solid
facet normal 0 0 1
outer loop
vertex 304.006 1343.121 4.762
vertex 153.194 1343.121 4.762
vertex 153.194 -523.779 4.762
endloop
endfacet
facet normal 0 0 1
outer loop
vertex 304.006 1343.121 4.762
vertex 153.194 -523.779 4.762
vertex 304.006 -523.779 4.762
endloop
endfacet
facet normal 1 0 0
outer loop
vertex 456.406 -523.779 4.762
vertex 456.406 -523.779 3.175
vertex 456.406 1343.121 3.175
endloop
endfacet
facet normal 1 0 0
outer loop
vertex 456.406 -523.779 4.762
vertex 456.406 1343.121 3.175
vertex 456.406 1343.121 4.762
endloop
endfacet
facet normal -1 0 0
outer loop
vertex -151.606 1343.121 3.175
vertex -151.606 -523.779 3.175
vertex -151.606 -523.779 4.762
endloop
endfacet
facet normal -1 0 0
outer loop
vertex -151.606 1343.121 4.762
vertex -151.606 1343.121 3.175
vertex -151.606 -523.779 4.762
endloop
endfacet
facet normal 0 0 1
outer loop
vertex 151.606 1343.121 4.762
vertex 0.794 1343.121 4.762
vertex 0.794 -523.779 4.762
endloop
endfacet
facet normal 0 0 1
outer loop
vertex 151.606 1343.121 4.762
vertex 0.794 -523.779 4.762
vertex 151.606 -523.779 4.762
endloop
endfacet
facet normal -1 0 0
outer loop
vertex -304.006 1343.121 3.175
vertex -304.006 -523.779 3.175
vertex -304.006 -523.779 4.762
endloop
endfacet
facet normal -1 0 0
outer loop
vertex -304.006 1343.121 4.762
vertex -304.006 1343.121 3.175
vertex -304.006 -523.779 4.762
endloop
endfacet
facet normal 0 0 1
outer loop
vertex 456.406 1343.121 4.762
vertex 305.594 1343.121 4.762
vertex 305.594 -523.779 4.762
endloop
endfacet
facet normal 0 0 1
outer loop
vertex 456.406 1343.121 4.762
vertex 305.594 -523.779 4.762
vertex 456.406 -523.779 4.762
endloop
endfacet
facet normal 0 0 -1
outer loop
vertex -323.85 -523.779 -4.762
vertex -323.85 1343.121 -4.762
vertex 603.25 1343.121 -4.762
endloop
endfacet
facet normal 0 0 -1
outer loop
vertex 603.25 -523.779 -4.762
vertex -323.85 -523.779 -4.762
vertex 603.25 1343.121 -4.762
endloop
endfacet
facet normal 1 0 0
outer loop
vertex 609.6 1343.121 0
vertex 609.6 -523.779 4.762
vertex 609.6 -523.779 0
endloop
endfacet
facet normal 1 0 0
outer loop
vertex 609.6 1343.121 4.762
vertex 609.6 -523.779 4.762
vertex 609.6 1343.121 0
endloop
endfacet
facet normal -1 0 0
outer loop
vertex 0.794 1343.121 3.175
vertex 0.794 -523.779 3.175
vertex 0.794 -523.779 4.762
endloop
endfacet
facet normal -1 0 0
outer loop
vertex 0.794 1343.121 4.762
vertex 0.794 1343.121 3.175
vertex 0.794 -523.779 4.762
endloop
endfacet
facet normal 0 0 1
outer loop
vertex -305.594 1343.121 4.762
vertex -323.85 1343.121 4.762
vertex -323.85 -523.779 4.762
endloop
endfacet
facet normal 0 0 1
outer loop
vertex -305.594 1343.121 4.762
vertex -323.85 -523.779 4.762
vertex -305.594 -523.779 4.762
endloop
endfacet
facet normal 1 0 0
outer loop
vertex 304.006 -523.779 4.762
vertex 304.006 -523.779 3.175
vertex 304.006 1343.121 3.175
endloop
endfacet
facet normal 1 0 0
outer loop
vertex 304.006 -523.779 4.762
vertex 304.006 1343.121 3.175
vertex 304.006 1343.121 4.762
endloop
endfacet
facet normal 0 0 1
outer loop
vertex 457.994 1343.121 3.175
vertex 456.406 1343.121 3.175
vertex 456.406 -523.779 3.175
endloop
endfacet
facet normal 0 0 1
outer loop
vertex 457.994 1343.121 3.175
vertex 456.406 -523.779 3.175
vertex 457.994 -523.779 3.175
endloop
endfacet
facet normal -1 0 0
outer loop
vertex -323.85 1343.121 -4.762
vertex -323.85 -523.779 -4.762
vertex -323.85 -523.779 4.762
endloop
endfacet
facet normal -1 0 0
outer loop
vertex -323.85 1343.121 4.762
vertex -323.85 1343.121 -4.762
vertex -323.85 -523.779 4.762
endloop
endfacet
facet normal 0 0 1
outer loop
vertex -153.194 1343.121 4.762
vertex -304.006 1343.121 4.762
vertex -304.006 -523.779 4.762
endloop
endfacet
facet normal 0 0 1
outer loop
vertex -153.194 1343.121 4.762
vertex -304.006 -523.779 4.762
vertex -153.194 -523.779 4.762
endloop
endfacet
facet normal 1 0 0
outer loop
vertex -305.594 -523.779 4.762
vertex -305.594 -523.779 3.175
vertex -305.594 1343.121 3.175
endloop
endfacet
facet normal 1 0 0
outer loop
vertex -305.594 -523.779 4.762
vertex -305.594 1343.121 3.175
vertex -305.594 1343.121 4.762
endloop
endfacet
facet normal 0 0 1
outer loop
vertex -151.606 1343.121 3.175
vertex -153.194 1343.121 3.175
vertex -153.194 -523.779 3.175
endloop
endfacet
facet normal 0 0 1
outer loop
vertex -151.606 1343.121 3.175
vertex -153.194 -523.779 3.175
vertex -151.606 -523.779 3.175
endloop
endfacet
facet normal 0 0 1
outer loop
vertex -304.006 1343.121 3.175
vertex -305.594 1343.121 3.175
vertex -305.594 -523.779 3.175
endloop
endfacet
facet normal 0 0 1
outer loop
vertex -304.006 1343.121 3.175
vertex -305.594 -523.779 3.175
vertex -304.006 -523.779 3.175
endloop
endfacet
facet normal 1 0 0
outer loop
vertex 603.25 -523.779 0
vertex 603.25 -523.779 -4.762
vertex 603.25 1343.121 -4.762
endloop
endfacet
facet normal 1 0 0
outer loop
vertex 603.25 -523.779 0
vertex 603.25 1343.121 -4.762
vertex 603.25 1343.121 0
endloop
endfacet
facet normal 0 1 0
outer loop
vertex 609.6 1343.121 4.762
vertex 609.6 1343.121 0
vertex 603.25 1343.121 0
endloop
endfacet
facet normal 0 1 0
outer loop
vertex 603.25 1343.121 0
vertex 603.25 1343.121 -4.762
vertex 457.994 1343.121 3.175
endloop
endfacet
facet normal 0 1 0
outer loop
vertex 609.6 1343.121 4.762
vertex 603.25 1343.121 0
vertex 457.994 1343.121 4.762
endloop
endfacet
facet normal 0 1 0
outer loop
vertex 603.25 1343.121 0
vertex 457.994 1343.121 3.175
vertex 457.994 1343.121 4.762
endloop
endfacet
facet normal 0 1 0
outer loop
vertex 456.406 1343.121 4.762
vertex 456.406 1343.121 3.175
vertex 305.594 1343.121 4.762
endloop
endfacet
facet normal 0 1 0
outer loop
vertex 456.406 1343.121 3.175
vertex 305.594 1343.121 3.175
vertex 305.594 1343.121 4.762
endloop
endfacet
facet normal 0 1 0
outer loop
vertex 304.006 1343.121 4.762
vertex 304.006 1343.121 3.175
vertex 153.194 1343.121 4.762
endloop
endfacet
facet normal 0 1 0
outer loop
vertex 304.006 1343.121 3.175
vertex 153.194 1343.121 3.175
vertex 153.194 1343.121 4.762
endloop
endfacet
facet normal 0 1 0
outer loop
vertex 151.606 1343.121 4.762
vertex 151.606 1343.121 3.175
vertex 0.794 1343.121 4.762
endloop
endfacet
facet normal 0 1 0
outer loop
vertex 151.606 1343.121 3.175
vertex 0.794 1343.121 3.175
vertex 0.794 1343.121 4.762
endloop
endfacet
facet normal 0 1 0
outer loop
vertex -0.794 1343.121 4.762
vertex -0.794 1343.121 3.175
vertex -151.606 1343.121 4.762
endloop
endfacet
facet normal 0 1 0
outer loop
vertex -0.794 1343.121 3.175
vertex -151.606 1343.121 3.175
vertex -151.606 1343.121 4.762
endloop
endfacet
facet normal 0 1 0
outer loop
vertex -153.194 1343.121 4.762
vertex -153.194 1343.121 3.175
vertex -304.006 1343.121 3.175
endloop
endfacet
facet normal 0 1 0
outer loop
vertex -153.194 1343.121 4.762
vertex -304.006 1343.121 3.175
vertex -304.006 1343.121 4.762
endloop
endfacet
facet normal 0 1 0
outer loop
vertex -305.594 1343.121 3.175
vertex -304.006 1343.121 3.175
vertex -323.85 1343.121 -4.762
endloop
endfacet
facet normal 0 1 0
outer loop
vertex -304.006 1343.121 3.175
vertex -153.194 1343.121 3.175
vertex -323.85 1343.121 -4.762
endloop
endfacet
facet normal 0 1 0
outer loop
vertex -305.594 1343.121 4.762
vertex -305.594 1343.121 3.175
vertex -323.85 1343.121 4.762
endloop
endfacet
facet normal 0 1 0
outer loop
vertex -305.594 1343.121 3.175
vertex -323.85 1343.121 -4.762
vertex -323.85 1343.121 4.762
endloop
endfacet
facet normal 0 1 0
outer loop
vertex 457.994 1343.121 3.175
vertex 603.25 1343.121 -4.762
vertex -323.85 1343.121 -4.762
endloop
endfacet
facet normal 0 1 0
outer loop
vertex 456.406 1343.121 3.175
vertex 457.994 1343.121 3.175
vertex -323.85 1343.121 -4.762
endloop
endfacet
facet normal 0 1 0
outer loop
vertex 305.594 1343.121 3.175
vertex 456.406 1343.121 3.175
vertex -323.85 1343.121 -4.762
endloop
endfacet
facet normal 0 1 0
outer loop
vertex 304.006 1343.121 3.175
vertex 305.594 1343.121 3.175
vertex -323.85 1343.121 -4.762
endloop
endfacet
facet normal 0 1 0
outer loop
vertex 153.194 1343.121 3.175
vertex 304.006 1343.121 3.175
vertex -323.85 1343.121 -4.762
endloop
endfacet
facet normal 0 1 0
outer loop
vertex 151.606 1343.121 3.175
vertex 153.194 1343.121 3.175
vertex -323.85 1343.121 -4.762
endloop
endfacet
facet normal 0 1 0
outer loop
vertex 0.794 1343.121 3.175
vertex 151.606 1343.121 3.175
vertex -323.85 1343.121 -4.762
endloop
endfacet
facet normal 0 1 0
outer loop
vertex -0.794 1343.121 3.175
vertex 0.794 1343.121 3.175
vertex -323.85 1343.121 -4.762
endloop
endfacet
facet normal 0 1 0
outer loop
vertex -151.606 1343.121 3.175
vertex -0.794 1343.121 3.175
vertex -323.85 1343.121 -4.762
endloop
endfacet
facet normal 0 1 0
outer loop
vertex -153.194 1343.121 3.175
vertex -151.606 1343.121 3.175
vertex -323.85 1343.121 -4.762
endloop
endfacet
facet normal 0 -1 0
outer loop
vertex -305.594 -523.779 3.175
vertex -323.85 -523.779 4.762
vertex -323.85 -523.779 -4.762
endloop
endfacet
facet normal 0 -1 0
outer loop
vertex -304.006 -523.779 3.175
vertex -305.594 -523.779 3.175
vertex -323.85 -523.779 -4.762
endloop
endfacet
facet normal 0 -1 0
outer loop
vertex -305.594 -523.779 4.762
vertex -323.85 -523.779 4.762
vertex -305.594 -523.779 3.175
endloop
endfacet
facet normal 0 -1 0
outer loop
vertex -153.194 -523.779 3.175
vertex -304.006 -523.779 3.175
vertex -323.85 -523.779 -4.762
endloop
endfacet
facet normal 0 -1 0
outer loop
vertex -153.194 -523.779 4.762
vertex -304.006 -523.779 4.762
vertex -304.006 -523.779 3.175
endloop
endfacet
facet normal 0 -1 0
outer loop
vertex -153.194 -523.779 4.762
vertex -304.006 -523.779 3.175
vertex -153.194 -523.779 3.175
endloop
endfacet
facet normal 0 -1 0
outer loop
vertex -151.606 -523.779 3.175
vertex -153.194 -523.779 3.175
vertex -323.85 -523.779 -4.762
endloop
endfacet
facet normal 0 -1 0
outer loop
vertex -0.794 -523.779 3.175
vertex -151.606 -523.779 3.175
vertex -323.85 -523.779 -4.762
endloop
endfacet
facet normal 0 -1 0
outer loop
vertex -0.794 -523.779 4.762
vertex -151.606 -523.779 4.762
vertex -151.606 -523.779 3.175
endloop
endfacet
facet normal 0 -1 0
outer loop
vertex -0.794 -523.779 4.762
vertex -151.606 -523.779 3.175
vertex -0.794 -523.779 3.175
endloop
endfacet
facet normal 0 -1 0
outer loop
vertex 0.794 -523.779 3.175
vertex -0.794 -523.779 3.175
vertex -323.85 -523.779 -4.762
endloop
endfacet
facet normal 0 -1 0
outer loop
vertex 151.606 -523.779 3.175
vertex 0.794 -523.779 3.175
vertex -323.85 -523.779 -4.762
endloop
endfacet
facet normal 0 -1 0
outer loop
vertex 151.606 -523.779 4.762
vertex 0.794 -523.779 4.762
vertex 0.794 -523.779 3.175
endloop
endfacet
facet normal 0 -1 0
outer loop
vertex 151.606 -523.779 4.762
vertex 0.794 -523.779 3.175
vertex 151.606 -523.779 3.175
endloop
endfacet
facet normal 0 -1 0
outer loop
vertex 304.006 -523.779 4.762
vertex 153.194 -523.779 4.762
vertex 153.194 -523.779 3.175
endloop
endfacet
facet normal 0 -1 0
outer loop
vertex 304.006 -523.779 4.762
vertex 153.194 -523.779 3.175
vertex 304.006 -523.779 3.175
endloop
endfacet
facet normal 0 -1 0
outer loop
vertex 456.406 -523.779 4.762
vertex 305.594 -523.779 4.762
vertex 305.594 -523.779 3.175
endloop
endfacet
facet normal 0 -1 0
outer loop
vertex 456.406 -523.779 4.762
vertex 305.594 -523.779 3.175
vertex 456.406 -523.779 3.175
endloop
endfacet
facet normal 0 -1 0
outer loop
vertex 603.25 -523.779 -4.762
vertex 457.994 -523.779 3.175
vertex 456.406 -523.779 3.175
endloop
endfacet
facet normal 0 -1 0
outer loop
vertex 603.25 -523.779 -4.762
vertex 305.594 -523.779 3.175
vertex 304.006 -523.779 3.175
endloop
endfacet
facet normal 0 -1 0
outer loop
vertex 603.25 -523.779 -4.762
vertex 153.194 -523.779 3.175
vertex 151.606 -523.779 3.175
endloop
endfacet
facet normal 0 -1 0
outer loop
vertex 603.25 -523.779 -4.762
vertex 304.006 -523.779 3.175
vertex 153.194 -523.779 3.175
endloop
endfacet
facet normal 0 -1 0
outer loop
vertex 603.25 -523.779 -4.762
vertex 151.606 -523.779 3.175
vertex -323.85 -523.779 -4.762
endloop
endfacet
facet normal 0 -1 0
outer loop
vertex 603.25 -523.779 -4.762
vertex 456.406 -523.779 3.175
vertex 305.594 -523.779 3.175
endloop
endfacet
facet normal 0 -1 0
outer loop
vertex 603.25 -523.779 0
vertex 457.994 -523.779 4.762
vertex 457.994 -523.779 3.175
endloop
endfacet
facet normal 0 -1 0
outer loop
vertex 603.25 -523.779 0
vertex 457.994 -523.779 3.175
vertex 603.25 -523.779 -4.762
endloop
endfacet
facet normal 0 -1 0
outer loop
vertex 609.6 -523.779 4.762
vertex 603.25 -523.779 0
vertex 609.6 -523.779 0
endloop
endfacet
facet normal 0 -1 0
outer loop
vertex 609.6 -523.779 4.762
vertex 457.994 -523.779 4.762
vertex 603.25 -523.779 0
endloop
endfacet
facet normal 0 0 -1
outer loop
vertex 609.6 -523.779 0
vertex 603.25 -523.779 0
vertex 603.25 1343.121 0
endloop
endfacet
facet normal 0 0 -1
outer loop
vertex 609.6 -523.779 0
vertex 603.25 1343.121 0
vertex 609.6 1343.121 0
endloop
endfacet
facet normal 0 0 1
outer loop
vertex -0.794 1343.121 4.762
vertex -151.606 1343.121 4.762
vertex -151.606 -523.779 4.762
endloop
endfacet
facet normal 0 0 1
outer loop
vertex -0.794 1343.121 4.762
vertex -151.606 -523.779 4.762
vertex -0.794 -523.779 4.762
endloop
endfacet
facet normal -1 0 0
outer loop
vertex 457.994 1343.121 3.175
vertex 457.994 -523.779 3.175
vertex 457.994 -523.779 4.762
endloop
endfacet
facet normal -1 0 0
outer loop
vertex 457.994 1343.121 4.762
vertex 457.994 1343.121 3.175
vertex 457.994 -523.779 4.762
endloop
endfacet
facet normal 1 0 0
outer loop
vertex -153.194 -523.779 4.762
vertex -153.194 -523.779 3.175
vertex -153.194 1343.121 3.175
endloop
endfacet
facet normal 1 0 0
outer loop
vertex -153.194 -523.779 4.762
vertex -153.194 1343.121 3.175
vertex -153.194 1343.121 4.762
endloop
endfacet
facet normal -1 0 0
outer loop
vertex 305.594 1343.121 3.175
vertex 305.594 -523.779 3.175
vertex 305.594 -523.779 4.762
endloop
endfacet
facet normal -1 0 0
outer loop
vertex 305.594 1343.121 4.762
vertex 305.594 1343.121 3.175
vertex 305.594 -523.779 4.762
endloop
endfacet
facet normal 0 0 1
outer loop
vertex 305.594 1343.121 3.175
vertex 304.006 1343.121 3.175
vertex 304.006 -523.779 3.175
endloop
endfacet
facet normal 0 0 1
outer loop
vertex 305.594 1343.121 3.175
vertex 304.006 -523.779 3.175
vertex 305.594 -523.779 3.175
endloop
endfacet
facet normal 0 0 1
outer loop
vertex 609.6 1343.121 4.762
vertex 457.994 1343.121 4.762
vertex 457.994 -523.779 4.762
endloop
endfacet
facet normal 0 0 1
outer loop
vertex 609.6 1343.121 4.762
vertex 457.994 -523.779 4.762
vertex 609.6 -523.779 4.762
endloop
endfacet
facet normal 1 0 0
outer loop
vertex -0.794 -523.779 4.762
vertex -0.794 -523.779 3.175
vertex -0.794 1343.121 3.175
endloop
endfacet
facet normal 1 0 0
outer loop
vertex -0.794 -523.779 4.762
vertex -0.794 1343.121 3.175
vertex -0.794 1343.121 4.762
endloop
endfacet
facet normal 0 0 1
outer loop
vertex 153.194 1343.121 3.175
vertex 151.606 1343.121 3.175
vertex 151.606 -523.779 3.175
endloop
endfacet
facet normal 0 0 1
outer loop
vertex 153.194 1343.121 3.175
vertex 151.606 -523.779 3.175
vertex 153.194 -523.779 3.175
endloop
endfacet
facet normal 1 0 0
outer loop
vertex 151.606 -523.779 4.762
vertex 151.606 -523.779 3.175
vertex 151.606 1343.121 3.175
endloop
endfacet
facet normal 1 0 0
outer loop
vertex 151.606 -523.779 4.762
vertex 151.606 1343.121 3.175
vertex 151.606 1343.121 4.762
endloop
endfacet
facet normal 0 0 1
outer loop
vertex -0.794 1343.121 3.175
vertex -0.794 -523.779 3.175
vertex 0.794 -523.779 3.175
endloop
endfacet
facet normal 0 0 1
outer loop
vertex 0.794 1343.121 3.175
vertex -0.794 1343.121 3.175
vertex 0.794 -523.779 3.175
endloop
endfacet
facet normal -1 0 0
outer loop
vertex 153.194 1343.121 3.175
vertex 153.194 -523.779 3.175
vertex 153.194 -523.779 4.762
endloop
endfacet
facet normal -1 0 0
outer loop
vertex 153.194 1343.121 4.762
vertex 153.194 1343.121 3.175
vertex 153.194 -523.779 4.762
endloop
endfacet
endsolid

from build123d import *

# Parameters (mm, degrees)
F0_W     = 1219.2
F0_H     = 2435.225
F1_DEPTH = 4.7625
F2_W     = 6.35
F2_H     = 4.7625
F3_DEPTH = 2435.226
F4_W     = 1.5875
F4_H     = 1.5875
F5_DEPTH = 2435.226
F6_W     = 285.75
F6_H     = 9.525
F7_DEPTH = 2435.226
F8_W     = 568.325
F8_H     = 9.525
F9_DEPTH = 933.451


with BuildPart() as f1:
    # F0 (on Top) → F1 (new body, symmetric)
    with BuildSketch(Plane.XY):
        with Locations((0, 693.83302)):
            Rectangle(F0_W, F0_H)
    extrude(amount=F1_DEPTH, both=True)

    # F2 (on face) → F3 (cut, through all)
    with BuildSketch(Plane.XZ.offset(523.77948)):
        with Locations((606.425, -2.38125)):
            Rectangle(F2_W, F2_H)
        with Locations((-606.425, 2.38125)):
            Rectangle(F2_W, F2_H)
    extrude(amount=-F3_DEPTH, mode=Mode.SUBTRACT)

    # F4 (on face) → F5 (cut, through all)
    with BuildSketch(Plane.XZ.offset(523.77948)):
        with Locations((-457.2, 3.96875)):
            Rectangle(F4_W, F4_H)
        with Locations((-304.8, 3.96875)):
            Rectangle(F4_W, F4_H)
        with Locations((-152.4, 3.96875)):
            Rectangle(F4_W, F4_H)
        with Locations((0, 3.96875)):
            Rectangle(F4_W, F4_H)
        with Locations((152.4, 3.96875)):
            Rectangle(F4_W, F4_H)
        with Locations((304.8, 3.96875)):
            Rectangle(F4_W, F4_H)
        with Locations((457.2, 3.96875)):
            Rectangle(F4_W, F4_H)
    extrude(amount=-F5_DEPTH, mode=Mode.SUBTRACT)

    # F6 (on face) → F7 (cut, through all)
    with BuildSketch(Plane.XZ.offset(523.77948)):
        with Locations((-466.725, 0)):
            Rectangle(F6_W, F6_H)
    extrude(amount=-F7_DEPTH, mode=Mode.SUBTRACT)

    # F8 (on face) → F9 (cut, through all)
    with BuildSketch(Plane(origin=(-323.85, 0, 0), x_dir=(0, -1, 0), z_dir=(-1, 0, 0))):
        with Locations((-1627.28302, 0)):
            Rectangle(F8_W, F8_H)
    extrude(amount=-F9_DEPTH, mode=Mode.SUBTRACT)


solid = f1.part
